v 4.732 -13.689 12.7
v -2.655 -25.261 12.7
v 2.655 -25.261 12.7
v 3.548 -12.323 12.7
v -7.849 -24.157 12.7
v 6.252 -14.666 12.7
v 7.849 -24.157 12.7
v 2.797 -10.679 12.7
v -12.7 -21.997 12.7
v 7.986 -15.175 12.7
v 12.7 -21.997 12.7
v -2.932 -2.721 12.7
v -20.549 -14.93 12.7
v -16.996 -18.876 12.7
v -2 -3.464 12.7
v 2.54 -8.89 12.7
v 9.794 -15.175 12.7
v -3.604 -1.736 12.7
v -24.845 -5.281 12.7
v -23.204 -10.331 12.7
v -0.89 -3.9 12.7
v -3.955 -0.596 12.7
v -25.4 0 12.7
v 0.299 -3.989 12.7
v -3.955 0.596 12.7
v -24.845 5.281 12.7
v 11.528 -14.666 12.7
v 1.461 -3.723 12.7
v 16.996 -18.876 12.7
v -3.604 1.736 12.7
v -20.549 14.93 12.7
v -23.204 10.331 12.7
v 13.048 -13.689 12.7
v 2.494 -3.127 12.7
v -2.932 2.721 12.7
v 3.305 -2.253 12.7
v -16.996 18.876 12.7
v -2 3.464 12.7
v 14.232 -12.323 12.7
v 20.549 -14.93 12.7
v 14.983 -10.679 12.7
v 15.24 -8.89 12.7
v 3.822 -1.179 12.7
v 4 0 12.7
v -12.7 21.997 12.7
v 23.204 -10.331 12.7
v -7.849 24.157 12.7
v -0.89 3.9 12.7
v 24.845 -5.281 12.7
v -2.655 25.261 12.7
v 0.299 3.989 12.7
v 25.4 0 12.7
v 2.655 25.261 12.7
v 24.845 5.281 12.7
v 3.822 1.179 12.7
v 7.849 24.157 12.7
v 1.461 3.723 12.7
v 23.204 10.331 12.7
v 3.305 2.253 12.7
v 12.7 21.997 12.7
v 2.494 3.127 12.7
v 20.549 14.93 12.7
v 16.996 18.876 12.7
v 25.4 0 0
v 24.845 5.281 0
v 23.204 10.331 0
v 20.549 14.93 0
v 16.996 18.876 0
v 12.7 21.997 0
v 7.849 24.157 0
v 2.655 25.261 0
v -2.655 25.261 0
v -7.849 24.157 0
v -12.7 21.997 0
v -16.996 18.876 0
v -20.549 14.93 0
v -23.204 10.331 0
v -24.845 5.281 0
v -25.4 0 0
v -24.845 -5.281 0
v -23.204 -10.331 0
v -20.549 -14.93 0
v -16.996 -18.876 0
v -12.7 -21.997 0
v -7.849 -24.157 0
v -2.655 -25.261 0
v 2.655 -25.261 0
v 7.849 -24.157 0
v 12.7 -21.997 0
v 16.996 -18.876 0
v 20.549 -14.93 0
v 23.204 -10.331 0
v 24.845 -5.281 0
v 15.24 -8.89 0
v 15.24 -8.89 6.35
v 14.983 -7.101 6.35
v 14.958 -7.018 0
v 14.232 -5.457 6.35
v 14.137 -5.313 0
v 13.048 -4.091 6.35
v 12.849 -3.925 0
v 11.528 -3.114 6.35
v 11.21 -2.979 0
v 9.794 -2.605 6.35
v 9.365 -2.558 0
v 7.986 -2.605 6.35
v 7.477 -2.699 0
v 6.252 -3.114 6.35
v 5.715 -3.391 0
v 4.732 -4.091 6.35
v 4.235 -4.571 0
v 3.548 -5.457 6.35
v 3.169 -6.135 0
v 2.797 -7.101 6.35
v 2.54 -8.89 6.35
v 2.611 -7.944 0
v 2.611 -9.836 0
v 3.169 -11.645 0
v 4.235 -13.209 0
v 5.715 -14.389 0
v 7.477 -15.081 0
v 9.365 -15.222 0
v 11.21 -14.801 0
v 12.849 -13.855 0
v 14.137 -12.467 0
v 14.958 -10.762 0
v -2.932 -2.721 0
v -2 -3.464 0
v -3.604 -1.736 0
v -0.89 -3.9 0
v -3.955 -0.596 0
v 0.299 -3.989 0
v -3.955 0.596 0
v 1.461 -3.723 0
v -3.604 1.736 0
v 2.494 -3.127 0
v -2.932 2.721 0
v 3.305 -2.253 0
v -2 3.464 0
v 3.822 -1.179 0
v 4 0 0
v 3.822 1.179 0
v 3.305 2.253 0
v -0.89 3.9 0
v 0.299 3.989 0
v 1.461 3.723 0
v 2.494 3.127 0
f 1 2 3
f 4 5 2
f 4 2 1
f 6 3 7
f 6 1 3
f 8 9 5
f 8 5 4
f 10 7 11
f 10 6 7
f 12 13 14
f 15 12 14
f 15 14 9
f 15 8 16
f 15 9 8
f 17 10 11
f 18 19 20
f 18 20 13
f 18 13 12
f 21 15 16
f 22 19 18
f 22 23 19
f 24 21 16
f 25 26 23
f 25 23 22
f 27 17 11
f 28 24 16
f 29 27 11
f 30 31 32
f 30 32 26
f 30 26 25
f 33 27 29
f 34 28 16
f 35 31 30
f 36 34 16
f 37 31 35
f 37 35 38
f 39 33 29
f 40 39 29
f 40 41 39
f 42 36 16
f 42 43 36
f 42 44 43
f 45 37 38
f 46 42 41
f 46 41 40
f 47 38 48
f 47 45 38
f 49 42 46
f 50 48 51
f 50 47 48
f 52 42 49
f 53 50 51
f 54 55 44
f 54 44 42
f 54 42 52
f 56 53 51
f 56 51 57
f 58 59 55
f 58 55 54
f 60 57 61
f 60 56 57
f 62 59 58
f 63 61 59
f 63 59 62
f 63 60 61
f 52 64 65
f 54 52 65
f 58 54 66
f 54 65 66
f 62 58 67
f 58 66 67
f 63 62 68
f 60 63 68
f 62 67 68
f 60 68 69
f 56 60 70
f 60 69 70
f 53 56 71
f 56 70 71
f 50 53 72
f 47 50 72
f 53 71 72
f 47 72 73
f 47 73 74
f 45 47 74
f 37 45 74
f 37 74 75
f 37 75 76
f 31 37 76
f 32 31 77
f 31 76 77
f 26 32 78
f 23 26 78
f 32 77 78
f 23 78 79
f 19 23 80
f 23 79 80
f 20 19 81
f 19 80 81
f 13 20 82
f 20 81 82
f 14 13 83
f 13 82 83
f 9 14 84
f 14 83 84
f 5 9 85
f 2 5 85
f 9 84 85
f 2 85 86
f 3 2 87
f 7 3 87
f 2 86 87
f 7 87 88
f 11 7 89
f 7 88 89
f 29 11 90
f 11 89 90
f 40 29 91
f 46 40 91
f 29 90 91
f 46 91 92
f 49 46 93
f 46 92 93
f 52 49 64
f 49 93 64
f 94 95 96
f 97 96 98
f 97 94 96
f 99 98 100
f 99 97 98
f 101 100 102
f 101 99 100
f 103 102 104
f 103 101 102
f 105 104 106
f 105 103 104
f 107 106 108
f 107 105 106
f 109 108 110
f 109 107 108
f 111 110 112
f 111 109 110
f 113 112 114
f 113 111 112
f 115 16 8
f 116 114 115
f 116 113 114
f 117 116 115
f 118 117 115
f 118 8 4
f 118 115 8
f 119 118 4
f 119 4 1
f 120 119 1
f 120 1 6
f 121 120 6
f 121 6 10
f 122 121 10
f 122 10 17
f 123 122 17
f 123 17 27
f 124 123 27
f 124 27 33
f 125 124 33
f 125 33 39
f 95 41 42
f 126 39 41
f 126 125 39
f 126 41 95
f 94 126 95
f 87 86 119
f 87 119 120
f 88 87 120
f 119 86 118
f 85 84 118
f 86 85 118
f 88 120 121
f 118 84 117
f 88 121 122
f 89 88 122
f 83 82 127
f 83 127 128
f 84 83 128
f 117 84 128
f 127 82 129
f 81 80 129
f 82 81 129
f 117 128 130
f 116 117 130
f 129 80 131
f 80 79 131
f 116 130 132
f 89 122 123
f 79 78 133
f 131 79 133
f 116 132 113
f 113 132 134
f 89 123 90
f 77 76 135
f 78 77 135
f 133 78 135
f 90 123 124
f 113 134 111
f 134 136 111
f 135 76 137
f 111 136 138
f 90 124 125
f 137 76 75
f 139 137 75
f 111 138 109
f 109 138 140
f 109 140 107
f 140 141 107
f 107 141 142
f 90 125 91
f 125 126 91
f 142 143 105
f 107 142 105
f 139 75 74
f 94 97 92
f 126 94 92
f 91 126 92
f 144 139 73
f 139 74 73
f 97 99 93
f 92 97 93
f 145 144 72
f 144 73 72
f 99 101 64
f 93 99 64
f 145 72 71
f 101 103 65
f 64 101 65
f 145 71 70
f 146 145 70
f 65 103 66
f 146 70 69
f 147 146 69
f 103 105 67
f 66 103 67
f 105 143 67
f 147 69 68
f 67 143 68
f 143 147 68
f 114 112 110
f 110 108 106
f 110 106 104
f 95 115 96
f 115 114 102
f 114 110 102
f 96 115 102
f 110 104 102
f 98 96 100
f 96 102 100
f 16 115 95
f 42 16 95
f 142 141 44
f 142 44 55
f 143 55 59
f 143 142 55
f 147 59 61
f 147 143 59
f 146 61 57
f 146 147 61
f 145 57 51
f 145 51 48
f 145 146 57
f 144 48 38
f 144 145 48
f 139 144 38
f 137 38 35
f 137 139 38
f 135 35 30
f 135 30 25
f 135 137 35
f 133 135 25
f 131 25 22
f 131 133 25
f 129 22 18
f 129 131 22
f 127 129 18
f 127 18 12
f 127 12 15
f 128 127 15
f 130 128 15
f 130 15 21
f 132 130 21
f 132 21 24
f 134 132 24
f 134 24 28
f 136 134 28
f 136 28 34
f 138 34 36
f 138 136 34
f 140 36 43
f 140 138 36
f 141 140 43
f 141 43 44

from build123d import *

# Parameters (mm, degrees)
SKETCH1_R           = 25.4
SKETCH1_R_2         = 4.0000047
BOSS_EXTRUDE1_DEPTH = 12.7
SKETCH2_R           = 6.35
CUT_EXTRUDE1_DEPTH  = 6.35
CUT_EXTRUDE2_DEPTH  = 12.7


with BuildPart() as part:
    # Sketch1 → Boss-Extrude1 (new body)
    with BuildSketch(Plane.XY):
        Circle(SKETCH1_R)
        Circle(SKETCH1_R_2, mode=Mode.SUBTRACT)
    extrude(amount=BOSS_EXTRUDE1_DEPTH)

    # Sketch2 → Cut-Extrude1 (cut)
    with BuildSketch(Plane.XY):
        with Locations((8.89, -8.89)):
            Circle(SKETCH2_R)
    extrude(amount=CUT_EXTRUDE1_DEPTH, mode=Mode.SUBTRACT)

    # Sketch3 → Cut-Extrude2 (cut)
    with BuildSketch(Plane.XY):
        with BuildLine():
            Line((2.54, -8.89), (15.24, -8.89))
            ThreePointArc((15.24, -8.89), (8.89, -15.24), (2.54, -8.89))
        make_face()
    extrude(amount=CUT_EXTRUDE2_DEPTH, mode=Mode.SUBTRACT)


solid = part.part
